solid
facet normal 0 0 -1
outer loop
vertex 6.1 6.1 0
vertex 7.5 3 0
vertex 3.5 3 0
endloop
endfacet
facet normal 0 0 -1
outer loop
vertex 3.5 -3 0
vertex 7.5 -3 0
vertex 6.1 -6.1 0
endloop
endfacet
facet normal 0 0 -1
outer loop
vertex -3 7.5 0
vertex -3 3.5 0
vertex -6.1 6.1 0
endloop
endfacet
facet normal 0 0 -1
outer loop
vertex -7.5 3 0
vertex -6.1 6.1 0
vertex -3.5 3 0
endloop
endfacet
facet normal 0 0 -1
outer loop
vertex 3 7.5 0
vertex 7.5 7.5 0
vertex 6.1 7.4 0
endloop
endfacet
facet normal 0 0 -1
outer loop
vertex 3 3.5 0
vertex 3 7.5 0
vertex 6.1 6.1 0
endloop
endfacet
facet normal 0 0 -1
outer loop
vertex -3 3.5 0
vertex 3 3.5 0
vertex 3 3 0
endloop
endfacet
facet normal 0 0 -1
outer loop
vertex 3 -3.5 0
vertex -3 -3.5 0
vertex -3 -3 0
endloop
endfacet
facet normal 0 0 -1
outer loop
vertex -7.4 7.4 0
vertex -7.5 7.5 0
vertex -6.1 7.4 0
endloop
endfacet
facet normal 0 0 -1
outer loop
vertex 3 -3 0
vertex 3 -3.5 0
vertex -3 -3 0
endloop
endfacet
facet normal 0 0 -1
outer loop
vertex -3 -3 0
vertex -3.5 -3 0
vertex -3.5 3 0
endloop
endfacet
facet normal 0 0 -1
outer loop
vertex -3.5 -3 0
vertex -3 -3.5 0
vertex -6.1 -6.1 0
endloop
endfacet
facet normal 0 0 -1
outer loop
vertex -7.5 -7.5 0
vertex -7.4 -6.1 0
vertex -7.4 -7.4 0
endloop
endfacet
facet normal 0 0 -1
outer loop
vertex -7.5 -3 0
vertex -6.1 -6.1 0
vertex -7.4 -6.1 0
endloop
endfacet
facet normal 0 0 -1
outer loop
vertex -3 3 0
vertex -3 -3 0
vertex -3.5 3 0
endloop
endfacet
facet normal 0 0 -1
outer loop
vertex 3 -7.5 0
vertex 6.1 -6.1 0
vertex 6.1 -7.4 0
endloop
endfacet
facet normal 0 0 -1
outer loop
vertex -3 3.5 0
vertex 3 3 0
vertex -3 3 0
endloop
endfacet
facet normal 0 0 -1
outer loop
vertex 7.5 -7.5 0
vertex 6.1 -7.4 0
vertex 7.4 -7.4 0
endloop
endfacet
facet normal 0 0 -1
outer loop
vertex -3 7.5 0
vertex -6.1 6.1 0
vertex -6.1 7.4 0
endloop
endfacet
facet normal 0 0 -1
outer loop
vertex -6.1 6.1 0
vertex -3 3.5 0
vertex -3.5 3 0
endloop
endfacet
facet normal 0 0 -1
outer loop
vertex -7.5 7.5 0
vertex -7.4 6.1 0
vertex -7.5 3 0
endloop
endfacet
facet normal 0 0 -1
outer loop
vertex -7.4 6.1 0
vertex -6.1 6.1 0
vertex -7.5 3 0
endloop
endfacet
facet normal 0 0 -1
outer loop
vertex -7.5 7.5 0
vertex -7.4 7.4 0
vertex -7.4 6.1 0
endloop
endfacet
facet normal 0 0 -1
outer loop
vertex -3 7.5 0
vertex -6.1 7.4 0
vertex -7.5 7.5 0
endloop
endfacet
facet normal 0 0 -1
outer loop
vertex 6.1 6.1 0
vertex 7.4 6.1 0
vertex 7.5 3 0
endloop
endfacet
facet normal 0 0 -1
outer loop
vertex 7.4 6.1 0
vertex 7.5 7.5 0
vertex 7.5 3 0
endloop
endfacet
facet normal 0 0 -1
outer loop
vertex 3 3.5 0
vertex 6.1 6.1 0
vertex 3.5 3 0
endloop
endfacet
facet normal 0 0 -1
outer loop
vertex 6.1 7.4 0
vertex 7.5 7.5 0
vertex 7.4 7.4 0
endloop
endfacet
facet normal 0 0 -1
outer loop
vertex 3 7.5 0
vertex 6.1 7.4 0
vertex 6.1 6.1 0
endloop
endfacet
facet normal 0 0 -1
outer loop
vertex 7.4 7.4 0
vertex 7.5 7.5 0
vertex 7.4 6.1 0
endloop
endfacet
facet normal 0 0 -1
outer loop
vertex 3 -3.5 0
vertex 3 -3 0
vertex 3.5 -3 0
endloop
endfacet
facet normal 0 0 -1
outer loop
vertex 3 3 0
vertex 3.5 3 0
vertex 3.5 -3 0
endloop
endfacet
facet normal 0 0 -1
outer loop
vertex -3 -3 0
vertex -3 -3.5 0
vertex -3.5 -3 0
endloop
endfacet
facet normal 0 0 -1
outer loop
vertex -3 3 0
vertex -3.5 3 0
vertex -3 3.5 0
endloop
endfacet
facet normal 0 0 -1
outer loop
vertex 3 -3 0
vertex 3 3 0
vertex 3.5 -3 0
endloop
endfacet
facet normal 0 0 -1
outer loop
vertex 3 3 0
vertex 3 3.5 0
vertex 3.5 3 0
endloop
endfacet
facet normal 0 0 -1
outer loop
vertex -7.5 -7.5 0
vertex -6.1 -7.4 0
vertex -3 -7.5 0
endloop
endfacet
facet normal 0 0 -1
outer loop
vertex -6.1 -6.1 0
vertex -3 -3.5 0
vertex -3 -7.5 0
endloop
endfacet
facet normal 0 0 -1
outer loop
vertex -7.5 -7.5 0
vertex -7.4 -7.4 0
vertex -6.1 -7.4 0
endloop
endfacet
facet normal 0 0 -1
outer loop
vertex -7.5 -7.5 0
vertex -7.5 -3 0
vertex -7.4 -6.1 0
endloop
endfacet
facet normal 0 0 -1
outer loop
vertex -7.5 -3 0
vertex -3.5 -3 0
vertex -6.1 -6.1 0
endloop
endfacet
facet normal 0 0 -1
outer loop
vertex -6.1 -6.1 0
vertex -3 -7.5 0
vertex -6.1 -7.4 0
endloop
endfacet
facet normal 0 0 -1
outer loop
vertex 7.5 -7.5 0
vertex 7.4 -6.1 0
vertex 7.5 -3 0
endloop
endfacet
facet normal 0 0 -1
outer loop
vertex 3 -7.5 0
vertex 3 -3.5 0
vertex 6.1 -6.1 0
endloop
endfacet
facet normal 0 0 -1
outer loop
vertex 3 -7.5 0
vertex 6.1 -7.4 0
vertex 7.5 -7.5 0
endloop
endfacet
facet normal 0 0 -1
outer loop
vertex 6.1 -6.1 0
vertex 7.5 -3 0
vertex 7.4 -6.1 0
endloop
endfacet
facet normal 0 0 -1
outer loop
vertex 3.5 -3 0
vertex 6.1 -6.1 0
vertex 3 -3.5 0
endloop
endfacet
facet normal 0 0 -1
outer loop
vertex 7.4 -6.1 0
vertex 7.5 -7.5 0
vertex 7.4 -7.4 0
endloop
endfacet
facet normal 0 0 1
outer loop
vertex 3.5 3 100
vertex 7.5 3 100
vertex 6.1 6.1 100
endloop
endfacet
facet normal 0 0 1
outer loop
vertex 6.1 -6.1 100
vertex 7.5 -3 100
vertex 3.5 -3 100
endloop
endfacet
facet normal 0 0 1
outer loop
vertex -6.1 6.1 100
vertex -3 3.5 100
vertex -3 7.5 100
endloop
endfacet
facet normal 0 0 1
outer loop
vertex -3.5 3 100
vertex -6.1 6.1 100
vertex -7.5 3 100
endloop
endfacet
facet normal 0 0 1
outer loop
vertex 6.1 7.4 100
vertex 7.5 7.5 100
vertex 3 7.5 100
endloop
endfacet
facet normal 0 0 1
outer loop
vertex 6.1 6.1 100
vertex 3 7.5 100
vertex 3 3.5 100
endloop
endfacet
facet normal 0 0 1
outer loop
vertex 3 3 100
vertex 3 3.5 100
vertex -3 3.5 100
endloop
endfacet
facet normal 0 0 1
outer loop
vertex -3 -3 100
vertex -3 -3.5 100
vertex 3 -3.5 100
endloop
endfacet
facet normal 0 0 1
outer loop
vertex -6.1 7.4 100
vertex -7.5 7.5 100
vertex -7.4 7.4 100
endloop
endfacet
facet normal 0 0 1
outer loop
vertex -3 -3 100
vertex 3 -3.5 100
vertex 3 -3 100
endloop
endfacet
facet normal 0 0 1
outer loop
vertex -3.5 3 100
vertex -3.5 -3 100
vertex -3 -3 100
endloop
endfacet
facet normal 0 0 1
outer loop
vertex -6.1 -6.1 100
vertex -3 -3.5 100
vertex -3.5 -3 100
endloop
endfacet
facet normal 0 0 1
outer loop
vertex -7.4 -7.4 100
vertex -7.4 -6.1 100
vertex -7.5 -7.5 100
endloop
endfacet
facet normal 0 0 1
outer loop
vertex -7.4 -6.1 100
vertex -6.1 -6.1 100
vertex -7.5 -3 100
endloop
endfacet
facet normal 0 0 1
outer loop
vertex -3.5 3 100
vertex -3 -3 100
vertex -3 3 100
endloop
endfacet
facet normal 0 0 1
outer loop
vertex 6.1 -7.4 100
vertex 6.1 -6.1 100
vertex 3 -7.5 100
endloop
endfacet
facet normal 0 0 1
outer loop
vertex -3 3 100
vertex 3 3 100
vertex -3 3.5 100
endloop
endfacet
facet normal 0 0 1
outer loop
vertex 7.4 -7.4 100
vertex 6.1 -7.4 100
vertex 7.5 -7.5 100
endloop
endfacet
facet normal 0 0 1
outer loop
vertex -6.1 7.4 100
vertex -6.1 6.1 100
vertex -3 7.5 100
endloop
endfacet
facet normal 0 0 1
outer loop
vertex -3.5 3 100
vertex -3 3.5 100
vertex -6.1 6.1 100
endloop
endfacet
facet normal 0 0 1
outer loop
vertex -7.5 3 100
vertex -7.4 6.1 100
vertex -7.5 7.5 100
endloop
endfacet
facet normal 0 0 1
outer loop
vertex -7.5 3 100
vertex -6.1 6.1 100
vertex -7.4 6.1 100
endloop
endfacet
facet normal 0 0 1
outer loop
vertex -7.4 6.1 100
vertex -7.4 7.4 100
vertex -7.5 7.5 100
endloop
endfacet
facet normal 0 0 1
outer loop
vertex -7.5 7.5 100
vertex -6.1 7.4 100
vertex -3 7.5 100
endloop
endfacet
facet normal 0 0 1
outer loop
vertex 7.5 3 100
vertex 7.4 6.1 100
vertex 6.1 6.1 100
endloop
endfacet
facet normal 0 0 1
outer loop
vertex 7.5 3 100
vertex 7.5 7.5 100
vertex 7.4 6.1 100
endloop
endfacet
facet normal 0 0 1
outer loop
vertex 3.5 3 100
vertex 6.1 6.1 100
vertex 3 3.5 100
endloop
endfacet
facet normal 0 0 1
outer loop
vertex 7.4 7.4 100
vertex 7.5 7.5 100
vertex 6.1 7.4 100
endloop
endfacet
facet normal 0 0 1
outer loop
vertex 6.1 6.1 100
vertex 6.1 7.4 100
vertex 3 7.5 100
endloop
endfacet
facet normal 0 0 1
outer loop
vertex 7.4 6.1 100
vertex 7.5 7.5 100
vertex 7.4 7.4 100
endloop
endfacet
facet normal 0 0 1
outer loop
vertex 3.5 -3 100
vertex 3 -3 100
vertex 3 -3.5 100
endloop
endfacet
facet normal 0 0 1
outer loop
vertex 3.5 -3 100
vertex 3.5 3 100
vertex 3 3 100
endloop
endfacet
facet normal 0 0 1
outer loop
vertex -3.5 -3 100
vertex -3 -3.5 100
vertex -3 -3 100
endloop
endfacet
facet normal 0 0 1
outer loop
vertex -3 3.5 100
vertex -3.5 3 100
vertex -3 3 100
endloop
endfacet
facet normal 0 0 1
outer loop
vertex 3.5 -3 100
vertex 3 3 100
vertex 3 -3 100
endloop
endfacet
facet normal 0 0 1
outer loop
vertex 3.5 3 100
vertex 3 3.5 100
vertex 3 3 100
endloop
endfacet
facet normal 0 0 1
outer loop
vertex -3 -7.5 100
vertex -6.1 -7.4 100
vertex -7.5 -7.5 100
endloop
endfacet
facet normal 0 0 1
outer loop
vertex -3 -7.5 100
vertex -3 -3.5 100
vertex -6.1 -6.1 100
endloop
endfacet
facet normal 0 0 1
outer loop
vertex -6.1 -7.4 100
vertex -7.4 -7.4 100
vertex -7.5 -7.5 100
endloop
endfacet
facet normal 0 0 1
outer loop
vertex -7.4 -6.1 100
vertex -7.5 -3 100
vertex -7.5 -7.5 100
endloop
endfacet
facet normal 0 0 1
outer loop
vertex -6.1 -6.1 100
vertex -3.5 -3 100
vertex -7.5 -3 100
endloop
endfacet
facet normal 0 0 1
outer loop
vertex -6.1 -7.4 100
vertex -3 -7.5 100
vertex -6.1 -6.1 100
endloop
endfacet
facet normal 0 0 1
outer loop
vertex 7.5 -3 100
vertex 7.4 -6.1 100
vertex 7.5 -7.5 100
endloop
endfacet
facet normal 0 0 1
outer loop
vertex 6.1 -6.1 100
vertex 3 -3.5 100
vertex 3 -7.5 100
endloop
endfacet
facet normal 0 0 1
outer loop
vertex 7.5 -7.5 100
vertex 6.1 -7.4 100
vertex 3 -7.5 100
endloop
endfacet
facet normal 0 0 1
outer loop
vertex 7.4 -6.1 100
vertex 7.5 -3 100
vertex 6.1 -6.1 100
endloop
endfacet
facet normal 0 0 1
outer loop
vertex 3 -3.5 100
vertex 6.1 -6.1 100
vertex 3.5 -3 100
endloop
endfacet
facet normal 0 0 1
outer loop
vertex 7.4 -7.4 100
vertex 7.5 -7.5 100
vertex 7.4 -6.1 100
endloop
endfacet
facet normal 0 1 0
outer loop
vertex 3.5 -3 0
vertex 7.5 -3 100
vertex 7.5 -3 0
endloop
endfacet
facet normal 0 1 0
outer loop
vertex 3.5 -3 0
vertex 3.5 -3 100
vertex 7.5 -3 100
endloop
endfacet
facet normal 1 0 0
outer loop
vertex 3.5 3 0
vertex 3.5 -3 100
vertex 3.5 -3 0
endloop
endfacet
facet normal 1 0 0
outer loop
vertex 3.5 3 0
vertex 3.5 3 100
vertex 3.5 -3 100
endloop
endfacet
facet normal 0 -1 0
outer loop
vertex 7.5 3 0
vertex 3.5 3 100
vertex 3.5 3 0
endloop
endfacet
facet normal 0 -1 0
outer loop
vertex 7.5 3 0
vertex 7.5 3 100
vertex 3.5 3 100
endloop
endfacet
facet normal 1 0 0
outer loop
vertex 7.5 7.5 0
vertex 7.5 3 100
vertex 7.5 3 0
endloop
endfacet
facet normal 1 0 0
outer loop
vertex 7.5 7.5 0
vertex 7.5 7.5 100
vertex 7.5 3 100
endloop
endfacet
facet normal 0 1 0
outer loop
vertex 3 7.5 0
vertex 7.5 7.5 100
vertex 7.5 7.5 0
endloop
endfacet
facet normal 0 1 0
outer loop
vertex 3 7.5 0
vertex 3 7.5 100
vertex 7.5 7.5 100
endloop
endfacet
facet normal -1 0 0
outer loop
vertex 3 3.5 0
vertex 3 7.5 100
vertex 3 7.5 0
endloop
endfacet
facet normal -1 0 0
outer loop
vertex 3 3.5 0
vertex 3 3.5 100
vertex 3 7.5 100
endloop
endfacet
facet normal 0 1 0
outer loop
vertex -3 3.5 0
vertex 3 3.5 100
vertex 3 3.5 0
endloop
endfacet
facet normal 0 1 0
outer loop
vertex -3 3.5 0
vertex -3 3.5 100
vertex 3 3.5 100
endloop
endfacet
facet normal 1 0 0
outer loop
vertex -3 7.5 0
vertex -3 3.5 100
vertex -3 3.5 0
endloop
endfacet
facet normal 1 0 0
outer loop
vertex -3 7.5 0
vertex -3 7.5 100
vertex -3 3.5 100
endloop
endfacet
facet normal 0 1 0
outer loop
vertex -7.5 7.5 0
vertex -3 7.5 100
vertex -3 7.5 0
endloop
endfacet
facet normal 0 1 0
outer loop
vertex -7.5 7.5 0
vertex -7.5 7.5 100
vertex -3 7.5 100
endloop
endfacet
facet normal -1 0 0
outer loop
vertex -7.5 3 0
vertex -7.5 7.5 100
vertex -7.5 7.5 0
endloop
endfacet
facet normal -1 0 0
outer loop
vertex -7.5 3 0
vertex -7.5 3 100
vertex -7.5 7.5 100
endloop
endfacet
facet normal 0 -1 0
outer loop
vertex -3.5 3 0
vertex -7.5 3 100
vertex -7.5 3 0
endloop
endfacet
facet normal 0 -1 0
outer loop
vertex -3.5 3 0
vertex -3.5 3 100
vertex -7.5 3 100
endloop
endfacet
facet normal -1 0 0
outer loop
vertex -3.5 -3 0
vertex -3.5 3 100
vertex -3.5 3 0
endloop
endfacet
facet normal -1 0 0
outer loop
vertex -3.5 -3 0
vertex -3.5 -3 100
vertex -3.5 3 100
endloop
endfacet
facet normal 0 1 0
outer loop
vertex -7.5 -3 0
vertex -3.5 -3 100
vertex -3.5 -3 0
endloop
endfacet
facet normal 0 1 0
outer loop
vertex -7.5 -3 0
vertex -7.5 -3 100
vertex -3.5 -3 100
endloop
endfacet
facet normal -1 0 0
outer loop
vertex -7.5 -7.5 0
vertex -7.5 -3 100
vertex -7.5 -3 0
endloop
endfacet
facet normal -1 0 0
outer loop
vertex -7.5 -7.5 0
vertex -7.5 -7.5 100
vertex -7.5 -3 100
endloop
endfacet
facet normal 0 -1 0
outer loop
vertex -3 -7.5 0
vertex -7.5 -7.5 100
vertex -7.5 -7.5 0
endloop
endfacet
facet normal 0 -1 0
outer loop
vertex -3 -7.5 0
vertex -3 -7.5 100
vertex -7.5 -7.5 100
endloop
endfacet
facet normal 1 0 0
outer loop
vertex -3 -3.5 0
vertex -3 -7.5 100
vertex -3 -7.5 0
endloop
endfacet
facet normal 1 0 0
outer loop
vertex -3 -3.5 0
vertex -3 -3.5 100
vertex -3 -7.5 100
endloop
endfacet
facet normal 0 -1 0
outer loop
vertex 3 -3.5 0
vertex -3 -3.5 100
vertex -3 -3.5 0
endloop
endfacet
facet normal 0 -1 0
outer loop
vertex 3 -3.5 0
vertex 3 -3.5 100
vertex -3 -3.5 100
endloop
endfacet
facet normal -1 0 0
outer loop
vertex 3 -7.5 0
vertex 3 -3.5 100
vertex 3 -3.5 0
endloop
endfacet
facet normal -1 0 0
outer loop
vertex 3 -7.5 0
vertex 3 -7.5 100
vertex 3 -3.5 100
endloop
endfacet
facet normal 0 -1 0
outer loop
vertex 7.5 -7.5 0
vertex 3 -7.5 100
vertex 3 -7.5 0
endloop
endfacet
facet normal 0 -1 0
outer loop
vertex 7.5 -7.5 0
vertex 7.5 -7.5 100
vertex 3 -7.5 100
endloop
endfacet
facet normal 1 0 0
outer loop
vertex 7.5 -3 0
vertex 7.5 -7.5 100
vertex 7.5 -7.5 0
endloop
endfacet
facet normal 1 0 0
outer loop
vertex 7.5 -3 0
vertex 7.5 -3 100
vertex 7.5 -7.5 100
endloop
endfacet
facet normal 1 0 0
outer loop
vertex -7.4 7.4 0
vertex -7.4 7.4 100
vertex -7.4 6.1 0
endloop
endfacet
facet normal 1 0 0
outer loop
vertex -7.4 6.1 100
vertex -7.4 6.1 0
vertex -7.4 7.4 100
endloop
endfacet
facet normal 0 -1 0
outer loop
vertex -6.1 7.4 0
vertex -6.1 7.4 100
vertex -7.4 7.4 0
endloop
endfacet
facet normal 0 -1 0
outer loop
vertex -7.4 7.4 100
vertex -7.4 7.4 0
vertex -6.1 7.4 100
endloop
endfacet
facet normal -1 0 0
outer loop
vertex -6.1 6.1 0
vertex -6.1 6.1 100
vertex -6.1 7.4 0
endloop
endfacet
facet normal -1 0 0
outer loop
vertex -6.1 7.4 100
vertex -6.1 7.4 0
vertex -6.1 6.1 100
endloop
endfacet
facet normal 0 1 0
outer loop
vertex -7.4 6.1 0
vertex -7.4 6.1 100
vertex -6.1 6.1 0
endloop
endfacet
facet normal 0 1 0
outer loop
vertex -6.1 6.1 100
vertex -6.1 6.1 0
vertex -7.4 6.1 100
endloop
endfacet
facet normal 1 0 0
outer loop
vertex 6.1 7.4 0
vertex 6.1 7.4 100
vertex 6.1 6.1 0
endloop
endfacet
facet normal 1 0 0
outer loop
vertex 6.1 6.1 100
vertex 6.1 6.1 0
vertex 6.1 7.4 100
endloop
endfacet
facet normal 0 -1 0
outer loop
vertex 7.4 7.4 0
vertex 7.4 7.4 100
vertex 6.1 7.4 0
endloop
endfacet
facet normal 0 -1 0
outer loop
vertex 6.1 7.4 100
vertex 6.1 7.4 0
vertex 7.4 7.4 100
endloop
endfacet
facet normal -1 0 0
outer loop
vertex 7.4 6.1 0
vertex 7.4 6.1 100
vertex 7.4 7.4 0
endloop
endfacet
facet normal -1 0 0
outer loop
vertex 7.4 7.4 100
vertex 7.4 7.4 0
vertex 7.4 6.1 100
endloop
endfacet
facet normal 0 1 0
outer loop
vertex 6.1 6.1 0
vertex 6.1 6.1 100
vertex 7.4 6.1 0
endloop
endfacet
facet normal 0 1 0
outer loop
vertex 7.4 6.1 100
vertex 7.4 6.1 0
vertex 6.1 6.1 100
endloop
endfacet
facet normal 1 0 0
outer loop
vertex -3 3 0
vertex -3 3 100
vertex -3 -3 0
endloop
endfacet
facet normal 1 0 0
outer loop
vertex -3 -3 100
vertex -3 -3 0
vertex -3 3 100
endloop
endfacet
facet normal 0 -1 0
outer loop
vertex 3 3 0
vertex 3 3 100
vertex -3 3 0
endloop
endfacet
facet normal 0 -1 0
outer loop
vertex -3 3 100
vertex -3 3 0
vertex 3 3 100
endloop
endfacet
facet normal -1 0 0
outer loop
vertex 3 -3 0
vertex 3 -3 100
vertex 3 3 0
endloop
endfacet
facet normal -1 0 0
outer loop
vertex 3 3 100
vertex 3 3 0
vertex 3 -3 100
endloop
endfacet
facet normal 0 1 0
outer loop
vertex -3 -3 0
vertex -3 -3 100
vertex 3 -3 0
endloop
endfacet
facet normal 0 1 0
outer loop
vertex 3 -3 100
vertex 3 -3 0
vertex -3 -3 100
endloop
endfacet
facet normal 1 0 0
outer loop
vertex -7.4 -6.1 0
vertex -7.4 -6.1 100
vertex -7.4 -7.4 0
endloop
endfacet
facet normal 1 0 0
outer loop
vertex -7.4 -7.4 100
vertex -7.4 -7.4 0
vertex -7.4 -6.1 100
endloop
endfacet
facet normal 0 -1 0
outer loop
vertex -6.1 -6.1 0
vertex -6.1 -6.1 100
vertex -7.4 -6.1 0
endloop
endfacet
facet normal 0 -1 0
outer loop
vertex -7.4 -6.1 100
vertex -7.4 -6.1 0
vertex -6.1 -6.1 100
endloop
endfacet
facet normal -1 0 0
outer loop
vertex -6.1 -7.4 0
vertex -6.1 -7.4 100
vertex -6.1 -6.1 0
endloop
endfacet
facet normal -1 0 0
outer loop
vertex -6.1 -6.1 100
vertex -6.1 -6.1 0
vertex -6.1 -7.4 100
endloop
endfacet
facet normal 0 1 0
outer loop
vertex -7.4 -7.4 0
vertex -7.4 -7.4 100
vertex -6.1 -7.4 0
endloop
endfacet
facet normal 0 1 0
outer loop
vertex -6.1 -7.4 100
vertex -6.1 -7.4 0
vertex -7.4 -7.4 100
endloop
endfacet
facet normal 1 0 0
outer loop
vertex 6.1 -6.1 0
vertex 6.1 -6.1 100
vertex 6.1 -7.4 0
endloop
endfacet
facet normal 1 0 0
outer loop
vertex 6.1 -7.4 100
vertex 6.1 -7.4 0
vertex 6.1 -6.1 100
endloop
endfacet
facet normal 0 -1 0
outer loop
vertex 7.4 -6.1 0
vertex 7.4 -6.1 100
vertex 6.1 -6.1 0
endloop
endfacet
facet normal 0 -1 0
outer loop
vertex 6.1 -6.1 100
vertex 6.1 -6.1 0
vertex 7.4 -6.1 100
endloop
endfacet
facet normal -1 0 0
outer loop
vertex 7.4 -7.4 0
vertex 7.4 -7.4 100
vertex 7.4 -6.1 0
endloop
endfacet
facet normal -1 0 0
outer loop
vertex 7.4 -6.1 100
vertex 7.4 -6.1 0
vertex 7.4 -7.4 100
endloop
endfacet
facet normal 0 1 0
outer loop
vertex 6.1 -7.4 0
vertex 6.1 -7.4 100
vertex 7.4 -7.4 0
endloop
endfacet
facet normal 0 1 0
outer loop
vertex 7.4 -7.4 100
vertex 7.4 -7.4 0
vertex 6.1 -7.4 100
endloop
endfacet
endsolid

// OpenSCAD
$fn = 64;

// 15x15 aluminium extrusion profile, 100mm long (T-slot style)
length = 100;
size   = 15;

// Profile parameters (kept simple but clearly "T-slot-like")
wall   = 1.5;   // outer wall thickness
slot_w = 6.0;   // slot opening width on each face
slot_d = 4.0;   // depth of slot cut from each face
core   = 6.0;   // central square void size

eps = 0.02;

module extrusion15_profile_2d() {
    // Ensure we never subtract away the entire body
    assert(size > 0 && length > 0);
    assert(core < size - 2*wall);
    assert(slot_d < size/2 - wall/2);
    assert(slot_w < size - 2*wall);

    difference() {
        // Outer boundary (15 x 15)
        square([size, size], center=true);

        // Central void
        square([core, core], center=true);

        // Four face slots (cut-ins) - positioned by formula, not arbitrary
        for (a = [0, 90, 180, 270]) {
            rotate(a)
                translate([size/2 - slot_d/2 + eps, 0])
                    square([slot_d + 2*eps, slot_w], center=true);
        }

        // Corner reliefs: keep them inside the wall so the outer perimeter remains intact
        // (prevents accidental "blank" results from over-subtraction)
        corner_relief = min(2.0, max(0.8, wall - 0.2));
        corner_pos = size/2 - wall/2; // stays within the outer wall region
        for (sx = [-1, 1], sy = [-1, 1]) {
            translate([sx*corner_pos, sy*corner_pos])
                square([corner_relief, corner_relief], center=true);
        }
    }
}

color([0.75, 0.78, 0.82])
linear_extrude(height=length, center=false, convexity=20)
    extrusion15_profile_2d();
